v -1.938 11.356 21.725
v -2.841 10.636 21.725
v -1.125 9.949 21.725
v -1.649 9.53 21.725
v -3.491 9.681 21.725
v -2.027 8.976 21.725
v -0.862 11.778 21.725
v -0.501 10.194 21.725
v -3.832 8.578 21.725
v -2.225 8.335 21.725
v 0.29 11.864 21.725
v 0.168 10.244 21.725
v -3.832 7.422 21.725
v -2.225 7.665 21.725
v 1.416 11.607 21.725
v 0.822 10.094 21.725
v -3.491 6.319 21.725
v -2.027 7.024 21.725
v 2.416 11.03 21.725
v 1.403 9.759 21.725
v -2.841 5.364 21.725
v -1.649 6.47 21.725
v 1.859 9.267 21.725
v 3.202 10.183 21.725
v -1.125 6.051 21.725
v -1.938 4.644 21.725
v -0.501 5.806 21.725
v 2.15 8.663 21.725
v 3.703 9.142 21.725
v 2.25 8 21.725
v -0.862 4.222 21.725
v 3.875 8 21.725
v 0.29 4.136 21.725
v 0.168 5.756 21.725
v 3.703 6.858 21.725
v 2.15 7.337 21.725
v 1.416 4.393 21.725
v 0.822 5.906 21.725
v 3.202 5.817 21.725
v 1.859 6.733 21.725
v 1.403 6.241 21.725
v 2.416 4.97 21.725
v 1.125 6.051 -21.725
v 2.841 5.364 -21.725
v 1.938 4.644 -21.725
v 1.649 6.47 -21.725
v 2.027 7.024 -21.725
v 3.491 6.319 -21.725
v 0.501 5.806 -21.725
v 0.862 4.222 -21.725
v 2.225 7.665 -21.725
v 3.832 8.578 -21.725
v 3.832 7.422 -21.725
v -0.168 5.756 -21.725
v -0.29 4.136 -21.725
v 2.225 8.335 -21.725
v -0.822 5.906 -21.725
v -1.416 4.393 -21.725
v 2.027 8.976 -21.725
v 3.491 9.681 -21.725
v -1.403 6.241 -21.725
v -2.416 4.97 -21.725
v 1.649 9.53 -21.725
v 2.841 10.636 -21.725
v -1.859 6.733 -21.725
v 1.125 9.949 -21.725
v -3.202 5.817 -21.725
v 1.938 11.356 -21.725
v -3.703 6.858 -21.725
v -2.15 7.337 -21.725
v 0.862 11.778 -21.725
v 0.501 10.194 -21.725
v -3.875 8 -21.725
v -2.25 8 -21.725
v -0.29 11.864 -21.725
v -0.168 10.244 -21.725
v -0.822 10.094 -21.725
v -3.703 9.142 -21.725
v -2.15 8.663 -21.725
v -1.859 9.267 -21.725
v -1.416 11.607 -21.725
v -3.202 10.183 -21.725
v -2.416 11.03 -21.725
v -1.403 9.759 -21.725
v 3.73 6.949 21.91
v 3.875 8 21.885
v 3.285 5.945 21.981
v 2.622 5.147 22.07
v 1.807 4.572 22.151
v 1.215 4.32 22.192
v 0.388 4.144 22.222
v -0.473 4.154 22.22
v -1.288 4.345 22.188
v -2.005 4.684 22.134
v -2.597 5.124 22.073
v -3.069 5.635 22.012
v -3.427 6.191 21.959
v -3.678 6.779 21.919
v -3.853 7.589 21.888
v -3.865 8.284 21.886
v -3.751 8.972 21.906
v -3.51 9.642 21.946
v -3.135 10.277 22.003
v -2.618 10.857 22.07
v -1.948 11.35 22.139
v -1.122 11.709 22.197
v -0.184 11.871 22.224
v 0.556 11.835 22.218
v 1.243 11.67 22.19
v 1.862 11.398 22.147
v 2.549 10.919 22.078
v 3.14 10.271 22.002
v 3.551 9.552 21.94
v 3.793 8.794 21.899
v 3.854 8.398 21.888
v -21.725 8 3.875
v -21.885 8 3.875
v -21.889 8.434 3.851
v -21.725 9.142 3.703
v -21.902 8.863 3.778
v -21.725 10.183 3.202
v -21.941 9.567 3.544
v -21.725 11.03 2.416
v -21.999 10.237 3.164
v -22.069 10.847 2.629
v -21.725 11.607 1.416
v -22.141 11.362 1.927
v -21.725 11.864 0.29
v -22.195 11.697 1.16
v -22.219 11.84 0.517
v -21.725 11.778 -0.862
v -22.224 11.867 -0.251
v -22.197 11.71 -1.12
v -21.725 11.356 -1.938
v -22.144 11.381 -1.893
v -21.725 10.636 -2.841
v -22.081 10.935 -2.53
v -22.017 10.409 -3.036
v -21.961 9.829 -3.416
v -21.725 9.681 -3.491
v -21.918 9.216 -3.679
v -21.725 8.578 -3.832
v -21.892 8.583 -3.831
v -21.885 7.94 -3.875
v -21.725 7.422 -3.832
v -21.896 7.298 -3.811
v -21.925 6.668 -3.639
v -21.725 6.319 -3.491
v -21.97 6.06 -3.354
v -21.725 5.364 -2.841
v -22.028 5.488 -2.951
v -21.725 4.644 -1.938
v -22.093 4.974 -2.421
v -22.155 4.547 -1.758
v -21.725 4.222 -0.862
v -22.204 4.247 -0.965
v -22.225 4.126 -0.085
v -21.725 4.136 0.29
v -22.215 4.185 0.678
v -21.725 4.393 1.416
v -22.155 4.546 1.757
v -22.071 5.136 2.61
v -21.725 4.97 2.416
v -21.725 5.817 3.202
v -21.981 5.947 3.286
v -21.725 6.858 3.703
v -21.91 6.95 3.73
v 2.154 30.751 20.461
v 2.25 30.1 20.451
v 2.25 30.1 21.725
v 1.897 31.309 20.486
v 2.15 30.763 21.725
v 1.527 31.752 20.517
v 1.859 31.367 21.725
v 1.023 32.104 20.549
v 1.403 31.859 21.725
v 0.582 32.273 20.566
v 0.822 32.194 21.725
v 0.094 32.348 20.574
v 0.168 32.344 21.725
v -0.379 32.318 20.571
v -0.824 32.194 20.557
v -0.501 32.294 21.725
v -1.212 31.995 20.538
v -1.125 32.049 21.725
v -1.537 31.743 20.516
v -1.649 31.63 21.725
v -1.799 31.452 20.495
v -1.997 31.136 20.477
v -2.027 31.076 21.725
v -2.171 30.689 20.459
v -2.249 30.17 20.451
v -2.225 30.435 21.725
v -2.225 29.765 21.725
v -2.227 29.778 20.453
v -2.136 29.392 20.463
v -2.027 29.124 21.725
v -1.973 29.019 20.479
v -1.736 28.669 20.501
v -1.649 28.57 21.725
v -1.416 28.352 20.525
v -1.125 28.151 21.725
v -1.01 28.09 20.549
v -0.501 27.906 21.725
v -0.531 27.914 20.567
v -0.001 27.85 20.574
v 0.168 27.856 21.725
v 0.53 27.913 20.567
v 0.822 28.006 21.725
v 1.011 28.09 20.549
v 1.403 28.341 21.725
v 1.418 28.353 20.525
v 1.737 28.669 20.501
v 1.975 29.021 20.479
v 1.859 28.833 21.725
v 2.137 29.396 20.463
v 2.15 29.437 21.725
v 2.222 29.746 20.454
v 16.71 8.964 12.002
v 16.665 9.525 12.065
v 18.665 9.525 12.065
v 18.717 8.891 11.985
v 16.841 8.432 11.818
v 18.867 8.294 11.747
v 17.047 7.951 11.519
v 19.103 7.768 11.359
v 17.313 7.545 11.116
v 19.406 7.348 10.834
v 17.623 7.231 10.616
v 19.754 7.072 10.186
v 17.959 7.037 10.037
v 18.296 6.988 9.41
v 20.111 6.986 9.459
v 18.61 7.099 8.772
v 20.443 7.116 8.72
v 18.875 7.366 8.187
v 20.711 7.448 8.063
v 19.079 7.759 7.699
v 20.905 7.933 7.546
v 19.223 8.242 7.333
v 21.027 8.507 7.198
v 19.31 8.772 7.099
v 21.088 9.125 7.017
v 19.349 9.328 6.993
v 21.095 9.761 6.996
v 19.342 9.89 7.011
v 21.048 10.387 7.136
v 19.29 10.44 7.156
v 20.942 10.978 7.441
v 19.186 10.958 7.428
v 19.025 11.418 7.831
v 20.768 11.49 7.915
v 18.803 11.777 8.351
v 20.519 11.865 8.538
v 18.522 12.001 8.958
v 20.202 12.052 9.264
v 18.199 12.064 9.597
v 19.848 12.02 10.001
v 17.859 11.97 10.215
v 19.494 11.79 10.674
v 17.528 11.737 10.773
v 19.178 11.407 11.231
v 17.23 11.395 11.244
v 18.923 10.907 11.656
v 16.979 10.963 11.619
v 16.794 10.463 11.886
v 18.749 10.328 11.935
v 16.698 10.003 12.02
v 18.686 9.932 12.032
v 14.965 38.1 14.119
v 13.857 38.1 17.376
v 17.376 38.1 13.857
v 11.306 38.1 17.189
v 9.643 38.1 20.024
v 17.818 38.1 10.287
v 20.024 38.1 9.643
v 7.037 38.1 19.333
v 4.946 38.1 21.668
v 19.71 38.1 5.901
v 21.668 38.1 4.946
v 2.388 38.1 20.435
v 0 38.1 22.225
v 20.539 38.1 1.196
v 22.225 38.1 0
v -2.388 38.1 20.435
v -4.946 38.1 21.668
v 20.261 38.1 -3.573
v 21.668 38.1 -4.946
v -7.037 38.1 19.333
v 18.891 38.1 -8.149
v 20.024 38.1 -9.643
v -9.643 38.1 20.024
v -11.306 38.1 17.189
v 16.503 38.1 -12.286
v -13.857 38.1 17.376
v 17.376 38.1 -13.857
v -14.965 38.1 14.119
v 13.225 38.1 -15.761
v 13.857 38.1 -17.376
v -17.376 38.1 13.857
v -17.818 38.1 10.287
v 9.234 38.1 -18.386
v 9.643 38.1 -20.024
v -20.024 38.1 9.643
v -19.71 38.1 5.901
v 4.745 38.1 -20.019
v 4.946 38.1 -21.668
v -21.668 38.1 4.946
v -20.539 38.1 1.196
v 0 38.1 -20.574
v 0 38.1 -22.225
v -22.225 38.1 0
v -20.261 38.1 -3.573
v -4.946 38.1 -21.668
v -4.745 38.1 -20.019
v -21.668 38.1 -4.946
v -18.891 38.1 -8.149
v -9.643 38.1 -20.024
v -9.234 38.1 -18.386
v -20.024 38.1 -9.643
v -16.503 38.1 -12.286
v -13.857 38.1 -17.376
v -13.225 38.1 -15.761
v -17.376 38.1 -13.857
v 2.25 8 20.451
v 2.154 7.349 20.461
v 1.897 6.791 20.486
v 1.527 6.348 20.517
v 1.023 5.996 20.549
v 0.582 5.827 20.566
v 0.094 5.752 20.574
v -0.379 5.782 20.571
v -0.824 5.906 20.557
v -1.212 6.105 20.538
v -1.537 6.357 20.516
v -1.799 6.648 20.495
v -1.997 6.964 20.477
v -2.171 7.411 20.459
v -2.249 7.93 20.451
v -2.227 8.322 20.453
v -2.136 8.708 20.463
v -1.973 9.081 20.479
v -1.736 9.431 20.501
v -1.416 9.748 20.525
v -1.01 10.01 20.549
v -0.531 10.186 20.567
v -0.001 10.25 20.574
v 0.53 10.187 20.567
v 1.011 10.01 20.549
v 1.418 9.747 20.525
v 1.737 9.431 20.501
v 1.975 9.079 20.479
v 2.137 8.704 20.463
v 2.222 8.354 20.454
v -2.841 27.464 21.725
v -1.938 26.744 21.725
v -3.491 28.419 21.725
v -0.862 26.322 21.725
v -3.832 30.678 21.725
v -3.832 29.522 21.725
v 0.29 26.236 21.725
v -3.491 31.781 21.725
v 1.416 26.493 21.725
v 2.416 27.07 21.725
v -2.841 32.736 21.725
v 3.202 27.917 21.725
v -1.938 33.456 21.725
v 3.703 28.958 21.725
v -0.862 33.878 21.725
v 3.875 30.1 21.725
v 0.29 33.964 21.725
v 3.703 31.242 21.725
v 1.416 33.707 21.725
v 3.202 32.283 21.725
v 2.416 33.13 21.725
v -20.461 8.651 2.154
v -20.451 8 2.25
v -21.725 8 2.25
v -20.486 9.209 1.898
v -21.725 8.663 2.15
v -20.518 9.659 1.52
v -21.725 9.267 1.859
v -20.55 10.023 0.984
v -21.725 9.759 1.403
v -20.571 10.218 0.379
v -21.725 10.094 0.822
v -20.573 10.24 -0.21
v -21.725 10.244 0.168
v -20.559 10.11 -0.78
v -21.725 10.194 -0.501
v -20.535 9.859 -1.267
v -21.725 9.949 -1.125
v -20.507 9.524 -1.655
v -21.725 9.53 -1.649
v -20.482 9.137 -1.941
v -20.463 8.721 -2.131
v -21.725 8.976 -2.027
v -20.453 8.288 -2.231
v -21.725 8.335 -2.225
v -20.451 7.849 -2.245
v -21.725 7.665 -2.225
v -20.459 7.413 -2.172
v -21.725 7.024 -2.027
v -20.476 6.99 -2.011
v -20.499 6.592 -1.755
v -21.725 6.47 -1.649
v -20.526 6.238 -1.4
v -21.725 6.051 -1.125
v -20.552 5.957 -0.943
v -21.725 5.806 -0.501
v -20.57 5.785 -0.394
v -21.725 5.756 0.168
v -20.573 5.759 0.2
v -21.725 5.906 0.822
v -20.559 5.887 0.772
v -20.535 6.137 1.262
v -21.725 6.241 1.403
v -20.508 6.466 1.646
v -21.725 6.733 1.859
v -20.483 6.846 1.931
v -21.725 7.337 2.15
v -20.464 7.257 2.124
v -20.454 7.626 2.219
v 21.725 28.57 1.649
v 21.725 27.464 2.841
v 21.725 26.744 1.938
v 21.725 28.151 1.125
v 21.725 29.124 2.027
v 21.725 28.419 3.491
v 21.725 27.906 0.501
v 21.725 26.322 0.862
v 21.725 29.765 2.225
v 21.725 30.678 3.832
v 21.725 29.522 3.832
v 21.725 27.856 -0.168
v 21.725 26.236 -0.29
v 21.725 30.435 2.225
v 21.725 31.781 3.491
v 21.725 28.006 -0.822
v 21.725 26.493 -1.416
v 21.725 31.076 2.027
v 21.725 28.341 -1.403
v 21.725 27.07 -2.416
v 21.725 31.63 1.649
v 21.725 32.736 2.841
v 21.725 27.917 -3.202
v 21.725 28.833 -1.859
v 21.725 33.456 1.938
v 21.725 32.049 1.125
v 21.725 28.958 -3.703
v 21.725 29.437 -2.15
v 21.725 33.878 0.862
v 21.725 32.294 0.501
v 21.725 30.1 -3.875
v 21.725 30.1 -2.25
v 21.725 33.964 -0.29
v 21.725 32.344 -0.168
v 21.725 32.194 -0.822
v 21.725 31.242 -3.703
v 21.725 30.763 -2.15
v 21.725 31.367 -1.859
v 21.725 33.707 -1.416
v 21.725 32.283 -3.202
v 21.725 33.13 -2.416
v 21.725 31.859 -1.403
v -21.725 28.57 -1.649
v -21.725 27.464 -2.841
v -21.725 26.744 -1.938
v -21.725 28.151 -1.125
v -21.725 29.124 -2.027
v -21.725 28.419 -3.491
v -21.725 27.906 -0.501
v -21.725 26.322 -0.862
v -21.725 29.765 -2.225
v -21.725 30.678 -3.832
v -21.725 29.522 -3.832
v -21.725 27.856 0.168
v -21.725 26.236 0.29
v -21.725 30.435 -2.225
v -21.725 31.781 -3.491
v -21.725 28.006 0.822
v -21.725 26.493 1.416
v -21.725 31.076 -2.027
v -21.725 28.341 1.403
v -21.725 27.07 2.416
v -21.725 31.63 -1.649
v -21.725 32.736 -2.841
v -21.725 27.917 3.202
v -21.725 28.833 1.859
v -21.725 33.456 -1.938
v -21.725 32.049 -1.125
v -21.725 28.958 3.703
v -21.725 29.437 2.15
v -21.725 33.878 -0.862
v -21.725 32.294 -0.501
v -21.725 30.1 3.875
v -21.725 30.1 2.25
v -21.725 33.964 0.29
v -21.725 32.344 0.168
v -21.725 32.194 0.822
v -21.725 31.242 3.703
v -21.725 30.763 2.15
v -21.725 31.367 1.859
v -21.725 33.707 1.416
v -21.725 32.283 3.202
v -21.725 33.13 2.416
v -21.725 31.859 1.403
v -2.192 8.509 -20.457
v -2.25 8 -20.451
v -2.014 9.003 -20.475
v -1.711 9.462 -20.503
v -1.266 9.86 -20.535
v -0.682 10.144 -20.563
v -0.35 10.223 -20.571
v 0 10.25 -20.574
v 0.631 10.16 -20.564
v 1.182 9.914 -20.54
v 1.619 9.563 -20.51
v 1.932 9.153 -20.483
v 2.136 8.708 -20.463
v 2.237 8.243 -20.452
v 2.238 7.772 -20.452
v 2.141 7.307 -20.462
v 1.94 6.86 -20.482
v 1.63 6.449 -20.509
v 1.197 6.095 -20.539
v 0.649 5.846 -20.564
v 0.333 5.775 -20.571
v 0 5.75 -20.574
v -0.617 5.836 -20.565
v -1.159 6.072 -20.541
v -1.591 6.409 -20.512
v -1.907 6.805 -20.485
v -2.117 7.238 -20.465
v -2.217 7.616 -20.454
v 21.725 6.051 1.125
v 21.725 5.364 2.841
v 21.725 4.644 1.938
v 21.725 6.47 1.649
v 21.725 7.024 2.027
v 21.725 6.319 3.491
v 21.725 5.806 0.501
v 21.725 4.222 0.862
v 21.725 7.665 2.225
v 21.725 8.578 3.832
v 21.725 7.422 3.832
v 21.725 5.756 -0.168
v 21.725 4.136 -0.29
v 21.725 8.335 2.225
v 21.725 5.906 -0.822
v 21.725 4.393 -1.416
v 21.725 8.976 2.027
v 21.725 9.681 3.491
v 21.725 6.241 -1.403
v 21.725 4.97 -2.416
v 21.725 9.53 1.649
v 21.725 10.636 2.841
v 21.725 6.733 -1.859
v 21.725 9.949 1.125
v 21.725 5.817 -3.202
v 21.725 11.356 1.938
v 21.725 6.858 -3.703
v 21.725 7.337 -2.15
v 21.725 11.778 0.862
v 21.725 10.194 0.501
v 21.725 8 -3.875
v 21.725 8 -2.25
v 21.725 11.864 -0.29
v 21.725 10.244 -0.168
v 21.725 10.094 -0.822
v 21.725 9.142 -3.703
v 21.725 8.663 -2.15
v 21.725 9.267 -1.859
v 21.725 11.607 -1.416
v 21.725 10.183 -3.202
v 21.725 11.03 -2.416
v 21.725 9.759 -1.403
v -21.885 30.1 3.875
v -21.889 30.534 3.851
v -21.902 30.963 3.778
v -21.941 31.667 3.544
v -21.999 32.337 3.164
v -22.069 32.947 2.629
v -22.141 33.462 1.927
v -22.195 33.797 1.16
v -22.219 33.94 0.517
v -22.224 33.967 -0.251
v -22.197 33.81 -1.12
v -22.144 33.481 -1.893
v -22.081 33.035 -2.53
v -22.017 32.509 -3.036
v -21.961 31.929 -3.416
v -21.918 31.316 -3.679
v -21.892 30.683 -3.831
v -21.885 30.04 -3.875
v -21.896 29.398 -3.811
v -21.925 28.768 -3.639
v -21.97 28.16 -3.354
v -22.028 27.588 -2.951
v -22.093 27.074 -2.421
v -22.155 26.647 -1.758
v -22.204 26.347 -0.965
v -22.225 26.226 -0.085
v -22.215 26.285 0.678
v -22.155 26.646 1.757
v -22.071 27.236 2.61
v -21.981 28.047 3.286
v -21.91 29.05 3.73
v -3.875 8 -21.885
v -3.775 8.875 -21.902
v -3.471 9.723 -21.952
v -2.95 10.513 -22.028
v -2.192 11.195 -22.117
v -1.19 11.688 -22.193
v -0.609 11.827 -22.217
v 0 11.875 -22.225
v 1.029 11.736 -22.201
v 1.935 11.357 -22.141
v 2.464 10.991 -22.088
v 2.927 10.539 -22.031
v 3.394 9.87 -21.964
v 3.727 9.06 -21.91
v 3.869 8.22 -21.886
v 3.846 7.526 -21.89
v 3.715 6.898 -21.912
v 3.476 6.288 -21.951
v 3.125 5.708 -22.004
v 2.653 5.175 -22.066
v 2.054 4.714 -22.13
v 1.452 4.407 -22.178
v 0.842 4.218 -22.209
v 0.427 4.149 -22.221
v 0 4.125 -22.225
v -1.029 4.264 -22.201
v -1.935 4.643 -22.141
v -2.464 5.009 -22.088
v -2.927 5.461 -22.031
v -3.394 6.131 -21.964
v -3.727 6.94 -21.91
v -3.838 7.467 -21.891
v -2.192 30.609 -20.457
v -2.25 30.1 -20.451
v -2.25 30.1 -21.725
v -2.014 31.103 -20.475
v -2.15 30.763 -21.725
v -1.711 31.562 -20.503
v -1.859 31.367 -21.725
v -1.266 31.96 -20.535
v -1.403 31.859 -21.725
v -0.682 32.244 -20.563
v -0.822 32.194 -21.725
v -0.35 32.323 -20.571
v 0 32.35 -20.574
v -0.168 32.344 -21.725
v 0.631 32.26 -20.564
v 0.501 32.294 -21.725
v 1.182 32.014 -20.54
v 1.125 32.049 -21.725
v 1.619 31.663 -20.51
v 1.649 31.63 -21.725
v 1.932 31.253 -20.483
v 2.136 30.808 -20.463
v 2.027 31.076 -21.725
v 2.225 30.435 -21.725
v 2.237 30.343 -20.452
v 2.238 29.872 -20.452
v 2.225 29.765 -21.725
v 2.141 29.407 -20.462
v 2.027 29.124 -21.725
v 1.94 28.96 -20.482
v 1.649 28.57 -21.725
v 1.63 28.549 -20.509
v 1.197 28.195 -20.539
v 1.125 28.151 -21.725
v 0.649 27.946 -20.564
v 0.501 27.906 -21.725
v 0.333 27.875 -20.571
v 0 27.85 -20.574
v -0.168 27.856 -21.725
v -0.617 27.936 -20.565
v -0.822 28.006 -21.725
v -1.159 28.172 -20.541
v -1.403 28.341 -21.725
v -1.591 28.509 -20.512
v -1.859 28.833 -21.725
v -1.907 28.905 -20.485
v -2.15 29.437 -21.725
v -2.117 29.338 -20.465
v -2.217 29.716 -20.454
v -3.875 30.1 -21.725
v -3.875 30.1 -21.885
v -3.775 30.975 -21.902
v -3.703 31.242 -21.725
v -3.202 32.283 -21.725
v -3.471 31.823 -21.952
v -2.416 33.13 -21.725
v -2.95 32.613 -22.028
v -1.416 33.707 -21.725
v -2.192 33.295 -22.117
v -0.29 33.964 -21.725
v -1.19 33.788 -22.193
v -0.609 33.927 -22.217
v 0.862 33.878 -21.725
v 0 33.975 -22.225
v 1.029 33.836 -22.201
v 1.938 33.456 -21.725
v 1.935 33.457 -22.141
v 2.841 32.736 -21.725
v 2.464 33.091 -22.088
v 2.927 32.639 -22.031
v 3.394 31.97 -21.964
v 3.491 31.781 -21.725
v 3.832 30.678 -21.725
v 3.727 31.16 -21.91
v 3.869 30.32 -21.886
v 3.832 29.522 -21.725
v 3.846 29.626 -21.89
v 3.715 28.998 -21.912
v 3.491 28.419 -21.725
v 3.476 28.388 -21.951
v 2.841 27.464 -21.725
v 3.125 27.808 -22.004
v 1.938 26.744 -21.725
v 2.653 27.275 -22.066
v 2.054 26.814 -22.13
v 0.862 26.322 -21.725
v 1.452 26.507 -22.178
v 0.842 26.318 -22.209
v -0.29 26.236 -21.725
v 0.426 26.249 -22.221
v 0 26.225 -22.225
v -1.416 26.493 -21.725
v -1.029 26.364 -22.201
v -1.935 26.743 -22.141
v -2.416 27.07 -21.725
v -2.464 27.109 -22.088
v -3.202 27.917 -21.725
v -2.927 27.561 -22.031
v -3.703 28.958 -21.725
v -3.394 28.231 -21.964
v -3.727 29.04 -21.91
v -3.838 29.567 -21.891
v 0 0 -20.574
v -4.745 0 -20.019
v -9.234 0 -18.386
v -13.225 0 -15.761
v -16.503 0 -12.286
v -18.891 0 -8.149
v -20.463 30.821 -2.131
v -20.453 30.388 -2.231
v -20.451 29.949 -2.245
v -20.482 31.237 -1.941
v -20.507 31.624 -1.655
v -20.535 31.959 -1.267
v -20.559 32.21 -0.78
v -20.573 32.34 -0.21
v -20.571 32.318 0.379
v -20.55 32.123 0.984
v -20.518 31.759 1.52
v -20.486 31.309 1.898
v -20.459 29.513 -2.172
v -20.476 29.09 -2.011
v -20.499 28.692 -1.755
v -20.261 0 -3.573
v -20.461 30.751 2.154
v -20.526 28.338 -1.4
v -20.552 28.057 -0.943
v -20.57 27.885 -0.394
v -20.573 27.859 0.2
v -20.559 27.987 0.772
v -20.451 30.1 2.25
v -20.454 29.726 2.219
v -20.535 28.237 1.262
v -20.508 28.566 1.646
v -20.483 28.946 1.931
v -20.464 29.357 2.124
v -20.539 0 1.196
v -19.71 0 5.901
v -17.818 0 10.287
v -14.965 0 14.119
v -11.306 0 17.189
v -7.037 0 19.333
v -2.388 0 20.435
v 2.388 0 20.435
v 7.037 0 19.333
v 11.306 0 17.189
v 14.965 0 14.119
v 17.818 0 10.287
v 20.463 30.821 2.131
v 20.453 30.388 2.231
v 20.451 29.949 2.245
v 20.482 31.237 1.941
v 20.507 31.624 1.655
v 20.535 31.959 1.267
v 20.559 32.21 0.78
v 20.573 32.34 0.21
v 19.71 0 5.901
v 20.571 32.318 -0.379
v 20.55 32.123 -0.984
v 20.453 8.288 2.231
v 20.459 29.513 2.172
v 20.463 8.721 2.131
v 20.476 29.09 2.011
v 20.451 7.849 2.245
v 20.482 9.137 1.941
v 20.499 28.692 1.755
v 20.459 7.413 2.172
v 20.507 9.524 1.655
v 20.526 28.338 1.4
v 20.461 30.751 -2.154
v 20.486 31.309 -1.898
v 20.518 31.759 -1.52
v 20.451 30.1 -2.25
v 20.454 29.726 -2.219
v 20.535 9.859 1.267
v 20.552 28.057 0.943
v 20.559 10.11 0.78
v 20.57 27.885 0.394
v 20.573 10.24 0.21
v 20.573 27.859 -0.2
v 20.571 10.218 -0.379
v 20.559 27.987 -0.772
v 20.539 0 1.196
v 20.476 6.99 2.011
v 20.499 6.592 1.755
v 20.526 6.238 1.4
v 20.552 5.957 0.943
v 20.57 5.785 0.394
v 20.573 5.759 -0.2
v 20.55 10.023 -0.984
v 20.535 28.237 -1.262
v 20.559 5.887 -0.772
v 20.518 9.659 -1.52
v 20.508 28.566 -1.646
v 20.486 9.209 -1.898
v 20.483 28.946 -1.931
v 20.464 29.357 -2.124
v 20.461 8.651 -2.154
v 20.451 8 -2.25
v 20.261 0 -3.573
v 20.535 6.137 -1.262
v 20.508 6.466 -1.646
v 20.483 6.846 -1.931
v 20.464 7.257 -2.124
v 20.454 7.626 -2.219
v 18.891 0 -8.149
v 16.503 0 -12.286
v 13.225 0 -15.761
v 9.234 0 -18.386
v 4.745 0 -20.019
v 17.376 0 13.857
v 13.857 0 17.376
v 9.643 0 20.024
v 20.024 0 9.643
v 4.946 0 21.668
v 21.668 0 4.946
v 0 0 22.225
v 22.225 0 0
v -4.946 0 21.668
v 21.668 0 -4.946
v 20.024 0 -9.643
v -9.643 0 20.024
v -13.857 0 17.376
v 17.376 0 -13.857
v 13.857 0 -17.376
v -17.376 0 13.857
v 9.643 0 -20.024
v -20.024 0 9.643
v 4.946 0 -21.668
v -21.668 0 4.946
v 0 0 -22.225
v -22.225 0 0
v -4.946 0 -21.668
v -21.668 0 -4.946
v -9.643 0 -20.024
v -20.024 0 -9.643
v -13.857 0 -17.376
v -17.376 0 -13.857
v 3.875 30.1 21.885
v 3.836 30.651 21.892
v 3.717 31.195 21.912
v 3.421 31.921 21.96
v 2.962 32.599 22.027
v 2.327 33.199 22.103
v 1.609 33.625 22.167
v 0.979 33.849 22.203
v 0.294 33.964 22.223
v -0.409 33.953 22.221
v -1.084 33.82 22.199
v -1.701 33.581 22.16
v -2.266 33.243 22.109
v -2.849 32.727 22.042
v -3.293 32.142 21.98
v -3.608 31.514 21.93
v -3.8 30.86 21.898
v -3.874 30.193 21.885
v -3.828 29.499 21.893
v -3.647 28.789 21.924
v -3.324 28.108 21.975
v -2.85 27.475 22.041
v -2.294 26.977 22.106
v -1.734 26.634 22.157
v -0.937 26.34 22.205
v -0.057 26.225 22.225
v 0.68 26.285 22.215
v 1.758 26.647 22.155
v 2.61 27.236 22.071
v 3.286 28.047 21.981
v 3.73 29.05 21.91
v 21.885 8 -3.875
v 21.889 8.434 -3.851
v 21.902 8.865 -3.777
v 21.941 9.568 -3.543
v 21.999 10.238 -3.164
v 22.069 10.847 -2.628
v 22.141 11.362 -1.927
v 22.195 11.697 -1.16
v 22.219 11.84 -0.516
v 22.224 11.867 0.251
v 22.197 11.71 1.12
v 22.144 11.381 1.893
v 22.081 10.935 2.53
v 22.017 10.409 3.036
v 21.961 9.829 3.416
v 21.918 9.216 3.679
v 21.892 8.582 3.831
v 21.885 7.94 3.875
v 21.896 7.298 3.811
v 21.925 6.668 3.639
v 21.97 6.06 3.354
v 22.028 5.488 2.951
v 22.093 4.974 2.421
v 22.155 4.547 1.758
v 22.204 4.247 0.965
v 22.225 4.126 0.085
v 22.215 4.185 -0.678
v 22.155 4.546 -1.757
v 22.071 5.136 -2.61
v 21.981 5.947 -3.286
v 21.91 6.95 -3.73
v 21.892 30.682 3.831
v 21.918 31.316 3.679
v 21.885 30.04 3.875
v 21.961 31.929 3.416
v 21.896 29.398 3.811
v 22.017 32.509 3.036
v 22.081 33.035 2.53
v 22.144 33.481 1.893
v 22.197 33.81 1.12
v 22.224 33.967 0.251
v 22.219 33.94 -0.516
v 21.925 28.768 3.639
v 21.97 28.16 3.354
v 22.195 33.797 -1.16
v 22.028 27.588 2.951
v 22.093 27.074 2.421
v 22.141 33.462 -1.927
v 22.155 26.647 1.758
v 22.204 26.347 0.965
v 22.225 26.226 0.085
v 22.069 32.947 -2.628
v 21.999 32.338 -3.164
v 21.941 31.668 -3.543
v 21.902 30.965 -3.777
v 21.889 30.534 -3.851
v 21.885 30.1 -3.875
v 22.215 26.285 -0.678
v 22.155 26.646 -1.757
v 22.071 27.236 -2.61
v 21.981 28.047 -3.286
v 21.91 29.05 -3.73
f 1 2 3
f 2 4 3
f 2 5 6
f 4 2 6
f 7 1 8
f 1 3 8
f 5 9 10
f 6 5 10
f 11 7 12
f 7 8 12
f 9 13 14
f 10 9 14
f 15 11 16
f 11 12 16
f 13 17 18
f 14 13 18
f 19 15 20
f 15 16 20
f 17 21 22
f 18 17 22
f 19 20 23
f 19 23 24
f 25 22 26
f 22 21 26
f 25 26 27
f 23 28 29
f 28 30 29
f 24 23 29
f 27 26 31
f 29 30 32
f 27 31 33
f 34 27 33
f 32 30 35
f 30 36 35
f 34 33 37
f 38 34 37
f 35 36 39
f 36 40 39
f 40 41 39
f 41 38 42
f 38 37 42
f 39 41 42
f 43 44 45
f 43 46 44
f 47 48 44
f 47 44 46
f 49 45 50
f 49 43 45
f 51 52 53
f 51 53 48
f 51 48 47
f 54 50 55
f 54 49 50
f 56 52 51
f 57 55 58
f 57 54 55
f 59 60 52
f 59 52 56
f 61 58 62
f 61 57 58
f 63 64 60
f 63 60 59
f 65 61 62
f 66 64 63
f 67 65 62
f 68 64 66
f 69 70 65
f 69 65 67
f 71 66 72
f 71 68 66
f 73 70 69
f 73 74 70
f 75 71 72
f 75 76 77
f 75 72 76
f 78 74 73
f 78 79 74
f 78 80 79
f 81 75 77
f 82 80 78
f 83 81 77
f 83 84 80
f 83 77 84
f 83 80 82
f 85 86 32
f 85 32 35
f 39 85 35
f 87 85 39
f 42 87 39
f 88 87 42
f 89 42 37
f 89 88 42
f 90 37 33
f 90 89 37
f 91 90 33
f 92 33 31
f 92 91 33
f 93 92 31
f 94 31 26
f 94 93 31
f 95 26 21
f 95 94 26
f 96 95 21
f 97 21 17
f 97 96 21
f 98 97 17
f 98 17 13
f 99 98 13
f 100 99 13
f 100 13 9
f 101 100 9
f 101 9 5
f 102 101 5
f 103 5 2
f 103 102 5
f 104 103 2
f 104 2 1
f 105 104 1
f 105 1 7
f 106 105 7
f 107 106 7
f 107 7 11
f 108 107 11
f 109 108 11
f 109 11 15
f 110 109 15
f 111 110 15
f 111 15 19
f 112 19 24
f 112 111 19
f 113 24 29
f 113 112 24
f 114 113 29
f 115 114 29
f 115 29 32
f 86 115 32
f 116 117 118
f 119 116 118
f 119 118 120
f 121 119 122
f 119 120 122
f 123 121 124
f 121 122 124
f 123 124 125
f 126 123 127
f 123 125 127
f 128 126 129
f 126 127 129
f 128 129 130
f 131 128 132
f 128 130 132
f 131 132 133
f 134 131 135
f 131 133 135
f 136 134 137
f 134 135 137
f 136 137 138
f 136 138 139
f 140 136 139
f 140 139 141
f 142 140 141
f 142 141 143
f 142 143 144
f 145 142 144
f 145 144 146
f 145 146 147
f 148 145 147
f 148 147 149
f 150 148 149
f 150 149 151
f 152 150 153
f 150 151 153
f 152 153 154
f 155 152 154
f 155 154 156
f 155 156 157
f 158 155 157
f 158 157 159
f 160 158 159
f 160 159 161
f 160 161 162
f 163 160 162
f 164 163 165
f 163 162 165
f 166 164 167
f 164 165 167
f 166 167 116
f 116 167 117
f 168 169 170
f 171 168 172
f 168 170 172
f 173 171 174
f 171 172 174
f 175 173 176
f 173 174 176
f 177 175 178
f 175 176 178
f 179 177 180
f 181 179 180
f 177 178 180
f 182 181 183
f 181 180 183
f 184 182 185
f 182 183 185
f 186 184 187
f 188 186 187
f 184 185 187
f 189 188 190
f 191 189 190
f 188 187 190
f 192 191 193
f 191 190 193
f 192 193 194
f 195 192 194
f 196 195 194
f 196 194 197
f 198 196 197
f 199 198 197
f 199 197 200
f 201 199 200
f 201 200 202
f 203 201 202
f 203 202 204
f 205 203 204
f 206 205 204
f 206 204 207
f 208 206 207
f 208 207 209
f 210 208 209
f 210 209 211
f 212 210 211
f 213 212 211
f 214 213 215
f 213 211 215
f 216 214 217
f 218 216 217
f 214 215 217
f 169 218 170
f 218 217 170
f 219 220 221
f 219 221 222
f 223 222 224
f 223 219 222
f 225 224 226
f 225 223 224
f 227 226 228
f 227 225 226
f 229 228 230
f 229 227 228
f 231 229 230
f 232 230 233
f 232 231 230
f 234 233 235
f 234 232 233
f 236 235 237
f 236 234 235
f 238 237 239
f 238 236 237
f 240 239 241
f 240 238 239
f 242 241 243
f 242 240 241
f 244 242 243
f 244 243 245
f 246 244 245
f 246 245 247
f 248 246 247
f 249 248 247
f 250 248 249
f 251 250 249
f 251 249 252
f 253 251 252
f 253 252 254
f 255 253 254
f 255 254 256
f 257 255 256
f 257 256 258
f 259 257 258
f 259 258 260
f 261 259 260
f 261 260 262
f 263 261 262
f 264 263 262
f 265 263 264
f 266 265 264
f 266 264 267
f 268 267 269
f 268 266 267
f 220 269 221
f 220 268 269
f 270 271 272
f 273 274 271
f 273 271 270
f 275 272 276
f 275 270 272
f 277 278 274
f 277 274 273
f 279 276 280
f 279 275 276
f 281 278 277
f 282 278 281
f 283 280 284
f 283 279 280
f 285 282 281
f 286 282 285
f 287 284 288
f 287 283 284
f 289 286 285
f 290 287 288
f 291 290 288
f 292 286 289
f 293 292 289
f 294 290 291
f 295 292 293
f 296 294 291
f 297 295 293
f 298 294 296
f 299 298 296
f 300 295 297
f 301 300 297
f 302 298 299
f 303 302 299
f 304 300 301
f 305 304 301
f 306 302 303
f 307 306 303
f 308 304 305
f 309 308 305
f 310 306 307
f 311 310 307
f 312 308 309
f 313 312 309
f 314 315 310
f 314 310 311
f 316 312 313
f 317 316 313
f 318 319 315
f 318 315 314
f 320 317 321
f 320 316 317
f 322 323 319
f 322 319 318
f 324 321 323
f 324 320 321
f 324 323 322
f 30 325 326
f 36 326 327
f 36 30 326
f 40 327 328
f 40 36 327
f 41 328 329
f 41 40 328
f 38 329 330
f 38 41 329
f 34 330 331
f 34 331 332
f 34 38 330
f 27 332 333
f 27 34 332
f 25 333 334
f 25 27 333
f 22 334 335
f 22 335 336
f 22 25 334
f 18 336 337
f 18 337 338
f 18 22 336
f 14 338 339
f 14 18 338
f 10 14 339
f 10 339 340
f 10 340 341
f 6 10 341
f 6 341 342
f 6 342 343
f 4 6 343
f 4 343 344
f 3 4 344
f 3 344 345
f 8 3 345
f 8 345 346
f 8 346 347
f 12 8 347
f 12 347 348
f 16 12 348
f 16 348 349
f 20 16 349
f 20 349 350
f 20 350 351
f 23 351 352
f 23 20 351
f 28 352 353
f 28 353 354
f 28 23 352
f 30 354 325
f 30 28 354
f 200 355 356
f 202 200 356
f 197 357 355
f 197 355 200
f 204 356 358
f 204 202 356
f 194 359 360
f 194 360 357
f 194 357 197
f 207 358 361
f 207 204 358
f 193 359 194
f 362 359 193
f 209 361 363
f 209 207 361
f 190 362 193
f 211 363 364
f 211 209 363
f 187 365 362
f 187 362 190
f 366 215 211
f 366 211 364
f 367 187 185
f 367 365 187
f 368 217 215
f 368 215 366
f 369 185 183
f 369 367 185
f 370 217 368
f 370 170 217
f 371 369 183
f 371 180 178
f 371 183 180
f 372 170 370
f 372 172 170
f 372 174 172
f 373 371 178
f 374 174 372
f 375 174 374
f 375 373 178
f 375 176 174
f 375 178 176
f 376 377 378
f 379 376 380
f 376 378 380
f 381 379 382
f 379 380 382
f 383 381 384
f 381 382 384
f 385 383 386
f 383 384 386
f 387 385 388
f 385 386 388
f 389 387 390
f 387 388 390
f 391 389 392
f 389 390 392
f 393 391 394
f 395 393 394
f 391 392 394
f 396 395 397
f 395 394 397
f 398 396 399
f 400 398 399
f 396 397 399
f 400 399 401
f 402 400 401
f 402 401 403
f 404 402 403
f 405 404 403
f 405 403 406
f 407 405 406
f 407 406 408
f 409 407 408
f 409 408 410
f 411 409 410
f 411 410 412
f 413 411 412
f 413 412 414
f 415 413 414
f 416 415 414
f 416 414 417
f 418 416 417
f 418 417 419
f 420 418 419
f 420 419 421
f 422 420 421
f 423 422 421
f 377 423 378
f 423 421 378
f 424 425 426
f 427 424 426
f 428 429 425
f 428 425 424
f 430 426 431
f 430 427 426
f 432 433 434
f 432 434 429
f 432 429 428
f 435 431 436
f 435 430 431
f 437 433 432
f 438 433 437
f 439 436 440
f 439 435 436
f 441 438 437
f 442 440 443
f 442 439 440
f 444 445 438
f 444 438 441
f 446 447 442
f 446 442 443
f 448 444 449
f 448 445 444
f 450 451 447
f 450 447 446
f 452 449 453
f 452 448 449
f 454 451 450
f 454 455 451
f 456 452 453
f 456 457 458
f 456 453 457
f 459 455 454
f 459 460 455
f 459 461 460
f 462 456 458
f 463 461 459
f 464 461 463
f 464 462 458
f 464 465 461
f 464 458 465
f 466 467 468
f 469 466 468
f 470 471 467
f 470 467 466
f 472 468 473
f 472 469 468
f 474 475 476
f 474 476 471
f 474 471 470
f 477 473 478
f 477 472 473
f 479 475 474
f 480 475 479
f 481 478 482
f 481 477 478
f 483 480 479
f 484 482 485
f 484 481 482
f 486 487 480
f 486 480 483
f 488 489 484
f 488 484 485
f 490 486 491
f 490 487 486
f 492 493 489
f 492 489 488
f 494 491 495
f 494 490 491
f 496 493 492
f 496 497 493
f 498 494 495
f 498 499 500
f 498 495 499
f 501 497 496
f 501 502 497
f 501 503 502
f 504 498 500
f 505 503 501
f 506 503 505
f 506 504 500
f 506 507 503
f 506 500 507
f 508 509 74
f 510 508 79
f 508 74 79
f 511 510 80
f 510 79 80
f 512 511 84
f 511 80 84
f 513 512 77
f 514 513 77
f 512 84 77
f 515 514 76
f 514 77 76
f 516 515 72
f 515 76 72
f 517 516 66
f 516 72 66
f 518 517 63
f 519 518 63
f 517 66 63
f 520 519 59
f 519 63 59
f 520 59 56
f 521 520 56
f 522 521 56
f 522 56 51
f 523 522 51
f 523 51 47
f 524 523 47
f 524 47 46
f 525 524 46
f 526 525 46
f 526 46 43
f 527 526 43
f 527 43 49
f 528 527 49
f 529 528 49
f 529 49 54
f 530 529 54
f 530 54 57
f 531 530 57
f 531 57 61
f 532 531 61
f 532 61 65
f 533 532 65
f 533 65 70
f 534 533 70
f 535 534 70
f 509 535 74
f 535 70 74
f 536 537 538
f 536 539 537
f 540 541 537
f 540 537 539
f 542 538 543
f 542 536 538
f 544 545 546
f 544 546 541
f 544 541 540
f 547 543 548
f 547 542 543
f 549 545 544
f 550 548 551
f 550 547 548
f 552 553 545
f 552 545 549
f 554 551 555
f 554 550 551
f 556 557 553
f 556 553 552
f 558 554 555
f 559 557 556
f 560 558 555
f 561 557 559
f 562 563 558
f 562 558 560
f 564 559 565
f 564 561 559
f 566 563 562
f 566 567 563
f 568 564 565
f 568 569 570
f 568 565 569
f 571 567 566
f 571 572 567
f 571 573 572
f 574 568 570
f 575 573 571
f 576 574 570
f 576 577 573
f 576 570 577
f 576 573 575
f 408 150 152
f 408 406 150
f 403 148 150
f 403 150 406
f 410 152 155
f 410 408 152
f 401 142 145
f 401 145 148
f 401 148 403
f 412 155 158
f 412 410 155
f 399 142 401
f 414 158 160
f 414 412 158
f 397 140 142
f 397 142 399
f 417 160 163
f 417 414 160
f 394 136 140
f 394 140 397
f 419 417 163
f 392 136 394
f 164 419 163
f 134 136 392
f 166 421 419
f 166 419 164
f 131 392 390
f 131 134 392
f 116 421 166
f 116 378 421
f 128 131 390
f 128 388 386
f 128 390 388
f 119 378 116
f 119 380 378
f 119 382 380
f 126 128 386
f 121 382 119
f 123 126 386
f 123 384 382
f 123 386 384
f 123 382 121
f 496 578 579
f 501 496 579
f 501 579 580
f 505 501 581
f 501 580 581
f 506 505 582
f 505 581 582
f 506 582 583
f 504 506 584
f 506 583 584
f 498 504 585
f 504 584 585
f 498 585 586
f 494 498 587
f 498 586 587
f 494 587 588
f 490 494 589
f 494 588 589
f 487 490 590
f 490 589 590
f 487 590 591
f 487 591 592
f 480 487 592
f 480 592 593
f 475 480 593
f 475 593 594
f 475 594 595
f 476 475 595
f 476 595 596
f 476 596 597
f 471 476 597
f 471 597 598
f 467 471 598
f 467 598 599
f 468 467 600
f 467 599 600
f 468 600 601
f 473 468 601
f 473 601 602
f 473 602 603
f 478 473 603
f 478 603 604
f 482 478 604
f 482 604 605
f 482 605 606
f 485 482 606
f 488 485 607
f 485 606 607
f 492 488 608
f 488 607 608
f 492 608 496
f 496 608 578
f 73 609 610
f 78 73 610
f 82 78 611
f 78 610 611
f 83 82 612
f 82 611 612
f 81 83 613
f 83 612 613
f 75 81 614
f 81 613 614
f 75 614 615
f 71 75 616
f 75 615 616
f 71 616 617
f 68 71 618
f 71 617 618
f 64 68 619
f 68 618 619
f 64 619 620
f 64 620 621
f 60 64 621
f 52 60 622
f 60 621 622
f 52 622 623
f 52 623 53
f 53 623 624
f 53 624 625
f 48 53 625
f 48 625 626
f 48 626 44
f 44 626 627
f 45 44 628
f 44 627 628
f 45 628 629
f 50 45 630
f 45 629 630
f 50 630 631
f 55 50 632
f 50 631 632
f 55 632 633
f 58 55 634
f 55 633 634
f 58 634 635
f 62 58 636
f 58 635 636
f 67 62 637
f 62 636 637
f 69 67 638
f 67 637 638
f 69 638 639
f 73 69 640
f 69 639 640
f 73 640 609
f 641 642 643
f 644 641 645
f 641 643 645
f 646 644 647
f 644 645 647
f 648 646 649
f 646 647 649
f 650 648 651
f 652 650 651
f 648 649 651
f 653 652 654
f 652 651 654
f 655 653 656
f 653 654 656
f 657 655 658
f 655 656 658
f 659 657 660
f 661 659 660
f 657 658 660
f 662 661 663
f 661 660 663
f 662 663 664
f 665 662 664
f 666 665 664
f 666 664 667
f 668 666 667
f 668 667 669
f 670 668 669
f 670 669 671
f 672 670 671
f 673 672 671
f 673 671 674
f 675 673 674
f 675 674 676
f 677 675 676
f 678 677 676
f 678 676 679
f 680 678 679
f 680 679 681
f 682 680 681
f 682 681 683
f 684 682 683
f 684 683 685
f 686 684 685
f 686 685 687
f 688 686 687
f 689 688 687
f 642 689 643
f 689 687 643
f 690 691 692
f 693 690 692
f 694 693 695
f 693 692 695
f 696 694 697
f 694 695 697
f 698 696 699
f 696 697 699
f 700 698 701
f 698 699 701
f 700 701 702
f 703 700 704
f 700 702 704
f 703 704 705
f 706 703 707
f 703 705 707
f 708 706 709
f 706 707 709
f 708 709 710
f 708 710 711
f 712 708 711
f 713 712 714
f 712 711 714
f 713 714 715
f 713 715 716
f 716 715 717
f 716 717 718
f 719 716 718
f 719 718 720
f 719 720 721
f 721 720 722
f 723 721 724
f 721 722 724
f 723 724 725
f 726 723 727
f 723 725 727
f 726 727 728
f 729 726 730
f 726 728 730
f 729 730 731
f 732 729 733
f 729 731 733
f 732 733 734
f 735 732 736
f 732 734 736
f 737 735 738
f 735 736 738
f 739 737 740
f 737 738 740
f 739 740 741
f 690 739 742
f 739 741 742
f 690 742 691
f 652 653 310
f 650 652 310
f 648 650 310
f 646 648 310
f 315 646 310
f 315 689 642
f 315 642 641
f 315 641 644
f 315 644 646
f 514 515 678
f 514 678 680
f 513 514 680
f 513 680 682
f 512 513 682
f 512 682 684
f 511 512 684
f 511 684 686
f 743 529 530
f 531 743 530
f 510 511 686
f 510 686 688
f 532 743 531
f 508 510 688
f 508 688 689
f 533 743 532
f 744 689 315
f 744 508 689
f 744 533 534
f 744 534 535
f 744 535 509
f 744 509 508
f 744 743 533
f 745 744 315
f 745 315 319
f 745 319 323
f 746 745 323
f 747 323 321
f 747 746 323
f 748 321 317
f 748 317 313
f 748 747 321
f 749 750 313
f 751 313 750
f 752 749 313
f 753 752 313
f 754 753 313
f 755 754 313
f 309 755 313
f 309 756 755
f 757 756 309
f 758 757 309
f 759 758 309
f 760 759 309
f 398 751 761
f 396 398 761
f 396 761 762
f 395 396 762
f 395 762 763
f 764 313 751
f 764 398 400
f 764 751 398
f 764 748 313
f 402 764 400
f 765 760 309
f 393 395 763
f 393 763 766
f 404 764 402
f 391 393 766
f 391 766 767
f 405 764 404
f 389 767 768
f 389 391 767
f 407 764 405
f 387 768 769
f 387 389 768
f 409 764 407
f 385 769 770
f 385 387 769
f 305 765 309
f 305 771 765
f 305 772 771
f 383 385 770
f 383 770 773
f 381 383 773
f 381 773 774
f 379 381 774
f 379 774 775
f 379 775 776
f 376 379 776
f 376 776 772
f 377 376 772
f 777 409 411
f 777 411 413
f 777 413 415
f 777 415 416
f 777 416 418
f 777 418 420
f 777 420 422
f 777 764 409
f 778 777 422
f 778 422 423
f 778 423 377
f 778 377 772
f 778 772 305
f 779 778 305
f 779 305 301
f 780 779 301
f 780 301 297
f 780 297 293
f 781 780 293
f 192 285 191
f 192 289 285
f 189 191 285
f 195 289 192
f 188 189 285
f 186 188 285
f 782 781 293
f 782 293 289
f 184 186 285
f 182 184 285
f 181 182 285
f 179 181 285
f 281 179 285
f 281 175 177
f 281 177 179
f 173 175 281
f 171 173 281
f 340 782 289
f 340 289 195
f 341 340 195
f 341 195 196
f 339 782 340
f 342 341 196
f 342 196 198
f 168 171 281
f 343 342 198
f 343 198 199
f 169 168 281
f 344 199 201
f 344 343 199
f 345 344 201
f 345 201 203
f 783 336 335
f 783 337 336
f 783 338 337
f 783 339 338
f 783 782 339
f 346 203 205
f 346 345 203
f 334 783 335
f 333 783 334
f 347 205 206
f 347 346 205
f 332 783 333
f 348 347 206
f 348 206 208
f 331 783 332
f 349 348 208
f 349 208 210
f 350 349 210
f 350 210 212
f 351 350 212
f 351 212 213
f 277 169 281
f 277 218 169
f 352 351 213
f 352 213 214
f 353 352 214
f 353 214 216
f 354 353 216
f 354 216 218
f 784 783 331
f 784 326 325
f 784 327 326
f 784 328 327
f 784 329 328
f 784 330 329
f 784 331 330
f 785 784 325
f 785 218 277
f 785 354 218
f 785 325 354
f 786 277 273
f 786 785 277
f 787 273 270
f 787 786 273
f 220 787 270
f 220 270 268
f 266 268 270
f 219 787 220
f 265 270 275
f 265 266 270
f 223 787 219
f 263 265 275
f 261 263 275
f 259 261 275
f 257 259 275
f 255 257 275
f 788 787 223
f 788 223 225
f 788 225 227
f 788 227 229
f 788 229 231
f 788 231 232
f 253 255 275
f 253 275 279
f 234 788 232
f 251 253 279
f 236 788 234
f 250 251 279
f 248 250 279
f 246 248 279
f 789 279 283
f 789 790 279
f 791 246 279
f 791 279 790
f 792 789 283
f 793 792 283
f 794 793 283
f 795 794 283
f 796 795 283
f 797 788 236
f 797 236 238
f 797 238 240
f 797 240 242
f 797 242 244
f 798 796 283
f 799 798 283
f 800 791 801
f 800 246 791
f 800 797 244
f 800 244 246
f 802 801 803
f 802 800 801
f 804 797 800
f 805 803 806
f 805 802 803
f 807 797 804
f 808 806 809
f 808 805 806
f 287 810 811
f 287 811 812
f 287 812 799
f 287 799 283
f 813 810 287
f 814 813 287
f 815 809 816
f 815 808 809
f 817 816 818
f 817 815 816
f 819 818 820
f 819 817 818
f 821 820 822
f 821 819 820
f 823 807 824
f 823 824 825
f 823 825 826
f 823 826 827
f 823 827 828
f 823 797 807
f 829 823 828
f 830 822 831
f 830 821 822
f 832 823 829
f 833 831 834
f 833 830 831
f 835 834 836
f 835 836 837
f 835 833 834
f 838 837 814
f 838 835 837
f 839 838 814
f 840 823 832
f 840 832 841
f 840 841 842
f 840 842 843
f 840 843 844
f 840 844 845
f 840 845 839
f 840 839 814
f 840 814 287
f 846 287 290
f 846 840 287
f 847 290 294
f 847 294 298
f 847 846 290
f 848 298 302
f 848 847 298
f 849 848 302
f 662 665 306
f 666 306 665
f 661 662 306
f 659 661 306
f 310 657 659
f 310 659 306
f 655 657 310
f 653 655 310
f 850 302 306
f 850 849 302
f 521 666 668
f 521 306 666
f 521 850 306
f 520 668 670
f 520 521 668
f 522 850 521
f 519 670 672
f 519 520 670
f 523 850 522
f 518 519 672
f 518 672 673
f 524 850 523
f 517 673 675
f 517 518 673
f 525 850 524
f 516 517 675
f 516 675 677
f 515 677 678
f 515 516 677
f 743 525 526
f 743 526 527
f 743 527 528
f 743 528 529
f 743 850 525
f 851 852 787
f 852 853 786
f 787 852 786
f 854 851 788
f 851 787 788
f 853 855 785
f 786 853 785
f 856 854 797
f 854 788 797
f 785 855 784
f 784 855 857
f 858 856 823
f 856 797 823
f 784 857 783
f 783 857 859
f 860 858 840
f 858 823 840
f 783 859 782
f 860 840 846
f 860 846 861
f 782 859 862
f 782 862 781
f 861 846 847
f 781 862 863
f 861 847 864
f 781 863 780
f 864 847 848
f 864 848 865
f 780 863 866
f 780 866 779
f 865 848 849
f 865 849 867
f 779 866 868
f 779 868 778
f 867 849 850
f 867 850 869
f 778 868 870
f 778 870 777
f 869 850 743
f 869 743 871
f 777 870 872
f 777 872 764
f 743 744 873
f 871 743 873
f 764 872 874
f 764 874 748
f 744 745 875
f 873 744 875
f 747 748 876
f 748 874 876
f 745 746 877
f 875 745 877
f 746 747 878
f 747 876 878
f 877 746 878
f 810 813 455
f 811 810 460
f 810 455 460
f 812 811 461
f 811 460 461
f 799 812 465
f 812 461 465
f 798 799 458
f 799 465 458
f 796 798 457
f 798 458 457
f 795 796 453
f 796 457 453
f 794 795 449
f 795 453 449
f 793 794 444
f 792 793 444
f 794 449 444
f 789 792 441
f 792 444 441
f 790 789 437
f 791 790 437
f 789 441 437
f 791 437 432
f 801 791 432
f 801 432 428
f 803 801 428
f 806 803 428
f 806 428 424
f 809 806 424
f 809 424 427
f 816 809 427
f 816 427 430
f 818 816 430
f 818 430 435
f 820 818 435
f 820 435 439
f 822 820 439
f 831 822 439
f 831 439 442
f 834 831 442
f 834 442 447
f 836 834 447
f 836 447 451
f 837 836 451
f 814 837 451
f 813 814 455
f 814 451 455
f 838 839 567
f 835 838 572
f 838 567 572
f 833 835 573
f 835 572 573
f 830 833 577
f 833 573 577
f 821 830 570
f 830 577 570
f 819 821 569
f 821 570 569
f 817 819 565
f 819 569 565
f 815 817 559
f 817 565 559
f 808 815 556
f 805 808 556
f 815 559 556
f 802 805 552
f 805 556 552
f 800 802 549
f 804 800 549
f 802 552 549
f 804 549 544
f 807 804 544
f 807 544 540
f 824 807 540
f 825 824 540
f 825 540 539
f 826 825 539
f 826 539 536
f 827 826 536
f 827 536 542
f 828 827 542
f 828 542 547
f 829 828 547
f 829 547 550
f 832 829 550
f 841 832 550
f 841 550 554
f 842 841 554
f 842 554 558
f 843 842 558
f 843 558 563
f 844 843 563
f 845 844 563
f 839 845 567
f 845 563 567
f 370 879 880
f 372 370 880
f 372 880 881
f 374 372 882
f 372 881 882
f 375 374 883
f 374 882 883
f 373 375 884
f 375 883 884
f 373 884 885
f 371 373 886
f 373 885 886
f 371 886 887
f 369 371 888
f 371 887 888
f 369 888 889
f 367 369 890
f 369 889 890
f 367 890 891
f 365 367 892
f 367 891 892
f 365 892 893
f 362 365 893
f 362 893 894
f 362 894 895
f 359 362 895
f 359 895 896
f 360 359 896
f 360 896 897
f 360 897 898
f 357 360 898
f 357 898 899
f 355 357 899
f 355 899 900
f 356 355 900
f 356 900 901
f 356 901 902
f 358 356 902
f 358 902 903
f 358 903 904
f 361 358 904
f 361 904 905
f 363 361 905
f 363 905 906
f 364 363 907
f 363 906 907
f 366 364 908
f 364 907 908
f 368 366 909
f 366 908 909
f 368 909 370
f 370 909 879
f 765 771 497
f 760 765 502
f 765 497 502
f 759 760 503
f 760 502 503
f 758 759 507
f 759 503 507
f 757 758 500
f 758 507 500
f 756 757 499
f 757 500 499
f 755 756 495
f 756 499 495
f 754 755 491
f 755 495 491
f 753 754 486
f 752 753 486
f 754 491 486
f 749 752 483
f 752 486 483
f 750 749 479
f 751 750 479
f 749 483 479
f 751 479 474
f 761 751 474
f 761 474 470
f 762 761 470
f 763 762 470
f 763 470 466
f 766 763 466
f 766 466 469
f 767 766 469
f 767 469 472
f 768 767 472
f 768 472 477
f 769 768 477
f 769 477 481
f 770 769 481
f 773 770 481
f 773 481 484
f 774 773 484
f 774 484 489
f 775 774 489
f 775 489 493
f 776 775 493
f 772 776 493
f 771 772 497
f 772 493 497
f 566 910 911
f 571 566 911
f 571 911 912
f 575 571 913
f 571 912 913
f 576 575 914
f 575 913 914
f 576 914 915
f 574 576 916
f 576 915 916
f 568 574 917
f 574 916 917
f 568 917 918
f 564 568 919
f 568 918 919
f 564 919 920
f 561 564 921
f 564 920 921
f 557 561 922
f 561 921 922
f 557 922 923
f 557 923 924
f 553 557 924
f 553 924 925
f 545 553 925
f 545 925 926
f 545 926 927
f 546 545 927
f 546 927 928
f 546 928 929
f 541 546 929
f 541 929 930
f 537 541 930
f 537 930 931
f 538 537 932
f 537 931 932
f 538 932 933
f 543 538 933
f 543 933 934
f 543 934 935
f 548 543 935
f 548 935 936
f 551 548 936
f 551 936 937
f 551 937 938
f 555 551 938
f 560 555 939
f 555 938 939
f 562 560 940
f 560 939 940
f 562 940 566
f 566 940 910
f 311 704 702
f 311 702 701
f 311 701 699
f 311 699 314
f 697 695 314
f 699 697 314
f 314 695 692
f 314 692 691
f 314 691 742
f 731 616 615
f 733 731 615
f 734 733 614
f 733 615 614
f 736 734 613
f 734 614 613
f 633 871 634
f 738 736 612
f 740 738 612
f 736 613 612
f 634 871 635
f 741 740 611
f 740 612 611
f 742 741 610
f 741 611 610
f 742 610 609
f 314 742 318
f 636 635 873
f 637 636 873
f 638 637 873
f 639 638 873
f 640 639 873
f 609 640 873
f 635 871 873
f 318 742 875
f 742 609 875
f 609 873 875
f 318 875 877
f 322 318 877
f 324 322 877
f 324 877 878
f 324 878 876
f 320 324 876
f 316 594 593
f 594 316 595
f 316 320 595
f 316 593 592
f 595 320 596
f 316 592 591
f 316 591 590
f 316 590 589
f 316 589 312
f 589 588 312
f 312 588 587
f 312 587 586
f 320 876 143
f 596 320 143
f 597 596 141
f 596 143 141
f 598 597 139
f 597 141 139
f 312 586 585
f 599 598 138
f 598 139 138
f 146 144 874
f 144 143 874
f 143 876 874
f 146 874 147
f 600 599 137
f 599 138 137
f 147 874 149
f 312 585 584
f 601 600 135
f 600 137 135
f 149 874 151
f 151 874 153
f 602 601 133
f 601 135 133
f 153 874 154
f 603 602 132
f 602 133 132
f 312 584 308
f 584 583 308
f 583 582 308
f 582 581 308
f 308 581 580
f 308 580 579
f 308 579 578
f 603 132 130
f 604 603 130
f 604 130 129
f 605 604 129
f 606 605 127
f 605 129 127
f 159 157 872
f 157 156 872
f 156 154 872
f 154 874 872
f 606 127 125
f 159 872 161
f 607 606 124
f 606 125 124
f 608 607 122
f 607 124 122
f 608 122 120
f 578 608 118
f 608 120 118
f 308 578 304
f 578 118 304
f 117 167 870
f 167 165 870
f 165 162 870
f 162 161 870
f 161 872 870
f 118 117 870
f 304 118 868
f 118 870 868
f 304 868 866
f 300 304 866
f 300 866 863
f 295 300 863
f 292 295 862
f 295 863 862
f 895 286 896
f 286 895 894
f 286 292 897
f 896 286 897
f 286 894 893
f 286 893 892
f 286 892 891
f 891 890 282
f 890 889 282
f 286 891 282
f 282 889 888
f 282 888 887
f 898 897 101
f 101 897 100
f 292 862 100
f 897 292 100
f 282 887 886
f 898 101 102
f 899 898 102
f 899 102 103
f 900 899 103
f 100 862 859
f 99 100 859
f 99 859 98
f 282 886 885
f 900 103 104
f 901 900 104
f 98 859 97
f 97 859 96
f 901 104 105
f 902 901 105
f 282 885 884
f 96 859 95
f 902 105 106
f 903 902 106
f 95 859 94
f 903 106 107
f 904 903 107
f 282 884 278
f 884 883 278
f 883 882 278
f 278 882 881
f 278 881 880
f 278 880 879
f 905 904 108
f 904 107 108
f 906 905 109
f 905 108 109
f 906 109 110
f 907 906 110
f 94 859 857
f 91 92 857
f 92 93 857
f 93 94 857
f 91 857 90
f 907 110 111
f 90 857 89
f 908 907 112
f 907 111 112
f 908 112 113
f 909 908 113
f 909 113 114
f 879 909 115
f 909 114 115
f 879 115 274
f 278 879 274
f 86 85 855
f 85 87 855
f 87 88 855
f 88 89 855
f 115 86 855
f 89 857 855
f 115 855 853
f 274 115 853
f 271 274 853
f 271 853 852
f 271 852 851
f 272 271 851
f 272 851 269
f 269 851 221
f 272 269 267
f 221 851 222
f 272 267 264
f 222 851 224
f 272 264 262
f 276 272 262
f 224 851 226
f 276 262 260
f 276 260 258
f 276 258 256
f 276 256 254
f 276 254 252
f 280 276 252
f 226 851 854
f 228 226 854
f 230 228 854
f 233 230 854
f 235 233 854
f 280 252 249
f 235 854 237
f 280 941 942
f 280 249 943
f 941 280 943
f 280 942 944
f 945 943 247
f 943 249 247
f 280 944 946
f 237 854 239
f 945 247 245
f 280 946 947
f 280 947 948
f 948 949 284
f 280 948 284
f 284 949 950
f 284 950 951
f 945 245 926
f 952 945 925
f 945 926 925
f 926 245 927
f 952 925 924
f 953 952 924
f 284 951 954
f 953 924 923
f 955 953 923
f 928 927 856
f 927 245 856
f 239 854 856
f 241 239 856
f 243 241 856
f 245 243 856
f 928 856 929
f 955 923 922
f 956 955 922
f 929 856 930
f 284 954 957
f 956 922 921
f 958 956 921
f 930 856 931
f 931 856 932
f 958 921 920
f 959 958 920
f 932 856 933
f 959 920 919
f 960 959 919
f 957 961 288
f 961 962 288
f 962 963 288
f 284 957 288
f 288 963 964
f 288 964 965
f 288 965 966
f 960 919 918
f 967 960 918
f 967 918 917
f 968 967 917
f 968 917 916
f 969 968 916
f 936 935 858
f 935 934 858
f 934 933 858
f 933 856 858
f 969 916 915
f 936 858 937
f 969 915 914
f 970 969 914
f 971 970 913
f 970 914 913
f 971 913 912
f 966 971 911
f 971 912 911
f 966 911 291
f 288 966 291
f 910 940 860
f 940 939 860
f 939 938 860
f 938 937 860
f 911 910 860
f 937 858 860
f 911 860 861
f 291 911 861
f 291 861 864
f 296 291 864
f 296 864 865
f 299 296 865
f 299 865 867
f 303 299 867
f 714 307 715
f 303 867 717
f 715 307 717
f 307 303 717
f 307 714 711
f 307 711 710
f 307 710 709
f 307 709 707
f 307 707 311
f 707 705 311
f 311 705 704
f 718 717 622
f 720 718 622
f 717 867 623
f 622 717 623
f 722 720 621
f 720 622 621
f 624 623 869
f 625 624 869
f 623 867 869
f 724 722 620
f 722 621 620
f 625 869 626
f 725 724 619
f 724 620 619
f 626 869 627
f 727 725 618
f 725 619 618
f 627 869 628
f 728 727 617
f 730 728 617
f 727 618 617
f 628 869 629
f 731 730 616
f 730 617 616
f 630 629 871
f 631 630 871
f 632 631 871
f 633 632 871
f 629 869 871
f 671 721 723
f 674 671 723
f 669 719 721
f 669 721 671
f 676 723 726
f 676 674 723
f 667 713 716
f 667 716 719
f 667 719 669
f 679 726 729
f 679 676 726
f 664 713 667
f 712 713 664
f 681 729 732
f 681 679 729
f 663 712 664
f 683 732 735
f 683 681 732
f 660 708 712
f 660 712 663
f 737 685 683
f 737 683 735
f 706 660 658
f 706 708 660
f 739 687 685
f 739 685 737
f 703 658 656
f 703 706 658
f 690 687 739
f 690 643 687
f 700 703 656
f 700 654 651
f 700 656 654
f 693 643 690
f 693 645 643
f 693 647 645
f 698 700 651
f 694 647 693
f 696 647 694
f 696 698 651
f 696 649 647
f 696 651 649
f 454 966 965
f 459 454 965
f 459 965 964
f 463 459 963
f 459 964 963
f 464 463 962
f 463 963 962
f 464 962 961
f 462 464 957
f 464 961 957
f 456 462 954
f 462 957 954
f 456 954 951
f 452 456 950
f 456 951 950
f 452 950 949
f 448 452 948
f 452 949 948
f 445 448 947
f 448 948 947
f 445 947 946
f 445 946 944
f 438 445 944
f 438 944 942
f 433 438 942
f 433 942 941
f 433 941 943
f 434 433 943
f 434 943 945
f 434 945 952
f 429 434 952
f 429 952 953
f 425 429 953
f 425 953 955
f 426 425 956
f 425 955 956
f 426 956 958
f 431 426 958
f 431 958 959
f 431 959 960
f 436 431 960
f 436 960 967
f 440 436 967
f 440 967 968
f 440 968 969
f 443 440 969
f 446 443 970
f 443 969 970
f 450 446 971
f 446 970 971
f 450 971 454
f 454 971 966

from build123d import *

# Parameters (mm, degrees)
SKETCH1_R                 = 22.225
SKETCH1_R_2               = 20.574
BOSS_EXTRUDE1_DEPTH       = 38.1
SKETCH2_R                 = 2.54
CUT_EXTRUDE1_DEPTH        = 50.8
SKETCH3_R                 = 3.875
SKETCH3_R_2               = 2.25
CUT_EXTRUDE2_DEPTH        = 0.5
SKETCH3_2_R               = 2.25
CUT_EXTRUDE3_DEPTH        = 16.17
CIRPATTERN1_COUNT         = 4
MIRROR1_COPY_1_SKETCH_R   = 3.875
MIRROR1_COPY_1_SKETCH_R_2 = 2.25
MIRROR1_COPY_1_DEPTH      = 0.5
MIRROR1_COPY_2_SKETCH_R   = 3.875
MIRROR1_COPY_2_SKETCH_R_2 = 2.25
MIRROR1_COPY_2_DEPTH      = 0.5
MIRROR1_COPY_3_SKETCH_R   = 3.875
MIRROR1_COPY_3_SKETCH_R_2 = 2.25
MIRROR1_COPY_3_DEPTH      = 0.5
MIRROR1_COPY_4_SKETCH_R   = 2.25
MIRROR1_COPY_4_DEPTH      = 16.17
MIRROR1_COPY_5_SKETCH_R   = 2.25
MIRROR1_COPY_5_DEPTH      = 16.17
MIRROR1_COPY_6_SKETCH_R   = 2.25
MIRROR1_COPY_6_DEPTH      = 16.17


with BuildPart() as part:
    # Sketch1 → Boss-Extrude1 (new body)
    with BuildSketch(Plane(origin=(0, 0, 0), x_dir=(-1, 0, 0), z_dir=(0, 1, 0))):
        with Locations(Location((0, 0, 0), (0, 0, 270))):
            Circle(SKETCH1_R)
        with Locations(Location((0, 0, 0), (0, 0, 270))):
            Circle(SKETCH1_R_2, mode=Mode.SUBTRACT)
    extrude(amount=BOSS_EXTRUDE1_DEPTH)

    # Sketch2 → Cut-Extrude1 (cut)
    with BuildSketch(Plane.YZ):
        with Locations(Location((9.525, 9.525, 0), (0, 0, 90))):
            Circle(SKETCH2_R)
    extrude(amount=CUT_EXTRUDE1_DEPTH, mode=Mode.SUBTRACT)

    # Sketch3 → Cut-Extrude2 (cut)
    with BuildSketch(Plane.XY.offset(22.225)):
        with Locations((0, 30.1)):
            Circle(SKETCH3_R)
        with Locations((0, 30.1)):
            Circle(SKETCH3_R_2, mode=Mode.SUBTRACT)
    cut_extrude2 = extrude(amount=-CUT_EXTRUDE2_DEPTH, mode=Mode.SUBTRACT)

    # Sketch3_2 → Cut-Extrude3 (cut)
    with BuildSketch(Plane.XY.offset(22.225)):
        with Locations((0, 30.1)):
            Circle(SKETCH3_2_R)
    cut_extrude3 = extrude(amount=-CUT_EXTRUDE3_DEPTH, mode=Mode.SUBTRACT)

    # CirPattern1: Cut-Extrude2, Cut-Extrude3 ×4 about axis
    cirpattern1_axis = Axis((0, 0, 0), (0, 1, 0))
    add([cut_extrude2.rotate(cirpattern1_axis, i * 360 / CIRPATTERN1_COUNT) for i in range(1, CIRPATTERN1_COUNT)], mode=Mode.SUBTRACT)
    add([cut_extrude3.rotate(cirpattern1_axis, i * 360 / CIRPATTERN1_COUNT) for i in range(1, CIRPATTERN1_COUNT)], mode=Mode.SUBTRACT)

    # Mirror1: Cut-Extrude2, Cut-Extrude3 across plane
    add(cut_extrude2.mirror(Plane(origin=(0, 19.05, 0), x_dir=(0, 0, 1), z_dir=(0, -1, 0))), mode=Mode.SUBTRACT)
    add(cut_extrude3.mirror(Plane(origin=(0, 19.05, 0), x_dir=(0, 0, 1), z_dir=(0, -1, 0))), mode=Mode.SUBTRACT)

    # Mirror1 copy 1 sketch → Mirror1 copy 1 (cut)
    with BuildSketch(Plane(origin=(22.225, 38.1, 0), x_dir=(0, 0, -1), z_dir=(1, 0, 0))):
        with Locations((0, -30.1)):
            Circle(MIRROR1_COPY_1_SKETCH_R)
        with Locations((0, -30.1)):
            Circle(MIRROR1_COPY_1_SKETCH_R_2, mode=Mode.SUBTRACT)
    extrude(amount=-MIRROR1_COPY_1_DEPTH, mode=Mode.SUBTRACT)

    # Mirror1 copy 2 sketch → Mirror1 copy 2 (cut)
    with BuildSketch(Plane(origin=(0, 38.1, -22.225), x_dir=(-1, 0, 0), z_dir=(0, 0, -1))):
        with Locations((0, -30.1)):
            Circle(MIRROR1_COPY_2_SKETCH_R)
        with Locations((0, -30.1)):
            Circle(MIRROR1_COPY_2_SKETCH_R_2, mode=Mode.SUBTRACT)
    extrude(amount=-MIRROR1_COPY_2_DEPTH, mode=Mode.SUBTRACT)

    # Mirror1 copy 3 sketch → Mirror1 copy 3 (cut)
    with BuildSketch(Plane(origin=(-22.225, 38.1, 0), x_dir=(0, 0, 1), z_dir=(-1, 0, 0))):
        with Locations((0, -30.1)):
            Circle(MIRROR1_COPY_3_SKETCH_R)
        with Locations((0, -30.1)):
            Circle(MIRROR1_COPY_3_SKETCH_R_2, mode=Mode.SUBTRACT)
    extrude(amount=-MIRROR1_COPY_3_DEPTH, mode=Mode.SUBTRACT)

    # Mirror1 copy 4 sketch → Mirror1 copy 4 (cut)
    with BuildSketch(Plane(origin=(22.225, 38.1, 0), x_dir=(0, 0, -1), z_dir=(1, 0, 0))):
        with Locations((0, -30.1)):
            Circle(MIRROR1_COPY_4_SKETCH_R)
    extrude(amount=-MIRROR1_COPY_4_DEPTH, mode=Mode.SUBTRACT)

    # Mirror1 copy 5 sketch → Mirror1 copy 5 (cut)
    with BuildSketch(Plane(origin=(0, 38.1, -22.225), x_dir=(-1, 0, 0), z_dir=(0, 0, -1))):
        with Locations((0, -30.1)):
            Circle(MIRROR1_COPY_5_SKETCH_R)
    extrude(amount=-MIRROR1_COPY_5_DEPTH, mode=Mode.SUBTRACT)

    # Mirror1 copy 6 sketch → Mirror1 copy 6 (cut)
    with BuildSketch(Plane(origin=(-22.225, 38.1, 0), x_dir=(0, 0, 1), z_dir=(-1, 0, 0))):
        with Locations((0, -30.1)):
            Circle(MIRROR1_COPY_6_SKETCH_R)
    extrude(amount=-MIRROR1_COPY_6_DEPTH, mode=Mode.SUBTRACT)


solid = part.part
